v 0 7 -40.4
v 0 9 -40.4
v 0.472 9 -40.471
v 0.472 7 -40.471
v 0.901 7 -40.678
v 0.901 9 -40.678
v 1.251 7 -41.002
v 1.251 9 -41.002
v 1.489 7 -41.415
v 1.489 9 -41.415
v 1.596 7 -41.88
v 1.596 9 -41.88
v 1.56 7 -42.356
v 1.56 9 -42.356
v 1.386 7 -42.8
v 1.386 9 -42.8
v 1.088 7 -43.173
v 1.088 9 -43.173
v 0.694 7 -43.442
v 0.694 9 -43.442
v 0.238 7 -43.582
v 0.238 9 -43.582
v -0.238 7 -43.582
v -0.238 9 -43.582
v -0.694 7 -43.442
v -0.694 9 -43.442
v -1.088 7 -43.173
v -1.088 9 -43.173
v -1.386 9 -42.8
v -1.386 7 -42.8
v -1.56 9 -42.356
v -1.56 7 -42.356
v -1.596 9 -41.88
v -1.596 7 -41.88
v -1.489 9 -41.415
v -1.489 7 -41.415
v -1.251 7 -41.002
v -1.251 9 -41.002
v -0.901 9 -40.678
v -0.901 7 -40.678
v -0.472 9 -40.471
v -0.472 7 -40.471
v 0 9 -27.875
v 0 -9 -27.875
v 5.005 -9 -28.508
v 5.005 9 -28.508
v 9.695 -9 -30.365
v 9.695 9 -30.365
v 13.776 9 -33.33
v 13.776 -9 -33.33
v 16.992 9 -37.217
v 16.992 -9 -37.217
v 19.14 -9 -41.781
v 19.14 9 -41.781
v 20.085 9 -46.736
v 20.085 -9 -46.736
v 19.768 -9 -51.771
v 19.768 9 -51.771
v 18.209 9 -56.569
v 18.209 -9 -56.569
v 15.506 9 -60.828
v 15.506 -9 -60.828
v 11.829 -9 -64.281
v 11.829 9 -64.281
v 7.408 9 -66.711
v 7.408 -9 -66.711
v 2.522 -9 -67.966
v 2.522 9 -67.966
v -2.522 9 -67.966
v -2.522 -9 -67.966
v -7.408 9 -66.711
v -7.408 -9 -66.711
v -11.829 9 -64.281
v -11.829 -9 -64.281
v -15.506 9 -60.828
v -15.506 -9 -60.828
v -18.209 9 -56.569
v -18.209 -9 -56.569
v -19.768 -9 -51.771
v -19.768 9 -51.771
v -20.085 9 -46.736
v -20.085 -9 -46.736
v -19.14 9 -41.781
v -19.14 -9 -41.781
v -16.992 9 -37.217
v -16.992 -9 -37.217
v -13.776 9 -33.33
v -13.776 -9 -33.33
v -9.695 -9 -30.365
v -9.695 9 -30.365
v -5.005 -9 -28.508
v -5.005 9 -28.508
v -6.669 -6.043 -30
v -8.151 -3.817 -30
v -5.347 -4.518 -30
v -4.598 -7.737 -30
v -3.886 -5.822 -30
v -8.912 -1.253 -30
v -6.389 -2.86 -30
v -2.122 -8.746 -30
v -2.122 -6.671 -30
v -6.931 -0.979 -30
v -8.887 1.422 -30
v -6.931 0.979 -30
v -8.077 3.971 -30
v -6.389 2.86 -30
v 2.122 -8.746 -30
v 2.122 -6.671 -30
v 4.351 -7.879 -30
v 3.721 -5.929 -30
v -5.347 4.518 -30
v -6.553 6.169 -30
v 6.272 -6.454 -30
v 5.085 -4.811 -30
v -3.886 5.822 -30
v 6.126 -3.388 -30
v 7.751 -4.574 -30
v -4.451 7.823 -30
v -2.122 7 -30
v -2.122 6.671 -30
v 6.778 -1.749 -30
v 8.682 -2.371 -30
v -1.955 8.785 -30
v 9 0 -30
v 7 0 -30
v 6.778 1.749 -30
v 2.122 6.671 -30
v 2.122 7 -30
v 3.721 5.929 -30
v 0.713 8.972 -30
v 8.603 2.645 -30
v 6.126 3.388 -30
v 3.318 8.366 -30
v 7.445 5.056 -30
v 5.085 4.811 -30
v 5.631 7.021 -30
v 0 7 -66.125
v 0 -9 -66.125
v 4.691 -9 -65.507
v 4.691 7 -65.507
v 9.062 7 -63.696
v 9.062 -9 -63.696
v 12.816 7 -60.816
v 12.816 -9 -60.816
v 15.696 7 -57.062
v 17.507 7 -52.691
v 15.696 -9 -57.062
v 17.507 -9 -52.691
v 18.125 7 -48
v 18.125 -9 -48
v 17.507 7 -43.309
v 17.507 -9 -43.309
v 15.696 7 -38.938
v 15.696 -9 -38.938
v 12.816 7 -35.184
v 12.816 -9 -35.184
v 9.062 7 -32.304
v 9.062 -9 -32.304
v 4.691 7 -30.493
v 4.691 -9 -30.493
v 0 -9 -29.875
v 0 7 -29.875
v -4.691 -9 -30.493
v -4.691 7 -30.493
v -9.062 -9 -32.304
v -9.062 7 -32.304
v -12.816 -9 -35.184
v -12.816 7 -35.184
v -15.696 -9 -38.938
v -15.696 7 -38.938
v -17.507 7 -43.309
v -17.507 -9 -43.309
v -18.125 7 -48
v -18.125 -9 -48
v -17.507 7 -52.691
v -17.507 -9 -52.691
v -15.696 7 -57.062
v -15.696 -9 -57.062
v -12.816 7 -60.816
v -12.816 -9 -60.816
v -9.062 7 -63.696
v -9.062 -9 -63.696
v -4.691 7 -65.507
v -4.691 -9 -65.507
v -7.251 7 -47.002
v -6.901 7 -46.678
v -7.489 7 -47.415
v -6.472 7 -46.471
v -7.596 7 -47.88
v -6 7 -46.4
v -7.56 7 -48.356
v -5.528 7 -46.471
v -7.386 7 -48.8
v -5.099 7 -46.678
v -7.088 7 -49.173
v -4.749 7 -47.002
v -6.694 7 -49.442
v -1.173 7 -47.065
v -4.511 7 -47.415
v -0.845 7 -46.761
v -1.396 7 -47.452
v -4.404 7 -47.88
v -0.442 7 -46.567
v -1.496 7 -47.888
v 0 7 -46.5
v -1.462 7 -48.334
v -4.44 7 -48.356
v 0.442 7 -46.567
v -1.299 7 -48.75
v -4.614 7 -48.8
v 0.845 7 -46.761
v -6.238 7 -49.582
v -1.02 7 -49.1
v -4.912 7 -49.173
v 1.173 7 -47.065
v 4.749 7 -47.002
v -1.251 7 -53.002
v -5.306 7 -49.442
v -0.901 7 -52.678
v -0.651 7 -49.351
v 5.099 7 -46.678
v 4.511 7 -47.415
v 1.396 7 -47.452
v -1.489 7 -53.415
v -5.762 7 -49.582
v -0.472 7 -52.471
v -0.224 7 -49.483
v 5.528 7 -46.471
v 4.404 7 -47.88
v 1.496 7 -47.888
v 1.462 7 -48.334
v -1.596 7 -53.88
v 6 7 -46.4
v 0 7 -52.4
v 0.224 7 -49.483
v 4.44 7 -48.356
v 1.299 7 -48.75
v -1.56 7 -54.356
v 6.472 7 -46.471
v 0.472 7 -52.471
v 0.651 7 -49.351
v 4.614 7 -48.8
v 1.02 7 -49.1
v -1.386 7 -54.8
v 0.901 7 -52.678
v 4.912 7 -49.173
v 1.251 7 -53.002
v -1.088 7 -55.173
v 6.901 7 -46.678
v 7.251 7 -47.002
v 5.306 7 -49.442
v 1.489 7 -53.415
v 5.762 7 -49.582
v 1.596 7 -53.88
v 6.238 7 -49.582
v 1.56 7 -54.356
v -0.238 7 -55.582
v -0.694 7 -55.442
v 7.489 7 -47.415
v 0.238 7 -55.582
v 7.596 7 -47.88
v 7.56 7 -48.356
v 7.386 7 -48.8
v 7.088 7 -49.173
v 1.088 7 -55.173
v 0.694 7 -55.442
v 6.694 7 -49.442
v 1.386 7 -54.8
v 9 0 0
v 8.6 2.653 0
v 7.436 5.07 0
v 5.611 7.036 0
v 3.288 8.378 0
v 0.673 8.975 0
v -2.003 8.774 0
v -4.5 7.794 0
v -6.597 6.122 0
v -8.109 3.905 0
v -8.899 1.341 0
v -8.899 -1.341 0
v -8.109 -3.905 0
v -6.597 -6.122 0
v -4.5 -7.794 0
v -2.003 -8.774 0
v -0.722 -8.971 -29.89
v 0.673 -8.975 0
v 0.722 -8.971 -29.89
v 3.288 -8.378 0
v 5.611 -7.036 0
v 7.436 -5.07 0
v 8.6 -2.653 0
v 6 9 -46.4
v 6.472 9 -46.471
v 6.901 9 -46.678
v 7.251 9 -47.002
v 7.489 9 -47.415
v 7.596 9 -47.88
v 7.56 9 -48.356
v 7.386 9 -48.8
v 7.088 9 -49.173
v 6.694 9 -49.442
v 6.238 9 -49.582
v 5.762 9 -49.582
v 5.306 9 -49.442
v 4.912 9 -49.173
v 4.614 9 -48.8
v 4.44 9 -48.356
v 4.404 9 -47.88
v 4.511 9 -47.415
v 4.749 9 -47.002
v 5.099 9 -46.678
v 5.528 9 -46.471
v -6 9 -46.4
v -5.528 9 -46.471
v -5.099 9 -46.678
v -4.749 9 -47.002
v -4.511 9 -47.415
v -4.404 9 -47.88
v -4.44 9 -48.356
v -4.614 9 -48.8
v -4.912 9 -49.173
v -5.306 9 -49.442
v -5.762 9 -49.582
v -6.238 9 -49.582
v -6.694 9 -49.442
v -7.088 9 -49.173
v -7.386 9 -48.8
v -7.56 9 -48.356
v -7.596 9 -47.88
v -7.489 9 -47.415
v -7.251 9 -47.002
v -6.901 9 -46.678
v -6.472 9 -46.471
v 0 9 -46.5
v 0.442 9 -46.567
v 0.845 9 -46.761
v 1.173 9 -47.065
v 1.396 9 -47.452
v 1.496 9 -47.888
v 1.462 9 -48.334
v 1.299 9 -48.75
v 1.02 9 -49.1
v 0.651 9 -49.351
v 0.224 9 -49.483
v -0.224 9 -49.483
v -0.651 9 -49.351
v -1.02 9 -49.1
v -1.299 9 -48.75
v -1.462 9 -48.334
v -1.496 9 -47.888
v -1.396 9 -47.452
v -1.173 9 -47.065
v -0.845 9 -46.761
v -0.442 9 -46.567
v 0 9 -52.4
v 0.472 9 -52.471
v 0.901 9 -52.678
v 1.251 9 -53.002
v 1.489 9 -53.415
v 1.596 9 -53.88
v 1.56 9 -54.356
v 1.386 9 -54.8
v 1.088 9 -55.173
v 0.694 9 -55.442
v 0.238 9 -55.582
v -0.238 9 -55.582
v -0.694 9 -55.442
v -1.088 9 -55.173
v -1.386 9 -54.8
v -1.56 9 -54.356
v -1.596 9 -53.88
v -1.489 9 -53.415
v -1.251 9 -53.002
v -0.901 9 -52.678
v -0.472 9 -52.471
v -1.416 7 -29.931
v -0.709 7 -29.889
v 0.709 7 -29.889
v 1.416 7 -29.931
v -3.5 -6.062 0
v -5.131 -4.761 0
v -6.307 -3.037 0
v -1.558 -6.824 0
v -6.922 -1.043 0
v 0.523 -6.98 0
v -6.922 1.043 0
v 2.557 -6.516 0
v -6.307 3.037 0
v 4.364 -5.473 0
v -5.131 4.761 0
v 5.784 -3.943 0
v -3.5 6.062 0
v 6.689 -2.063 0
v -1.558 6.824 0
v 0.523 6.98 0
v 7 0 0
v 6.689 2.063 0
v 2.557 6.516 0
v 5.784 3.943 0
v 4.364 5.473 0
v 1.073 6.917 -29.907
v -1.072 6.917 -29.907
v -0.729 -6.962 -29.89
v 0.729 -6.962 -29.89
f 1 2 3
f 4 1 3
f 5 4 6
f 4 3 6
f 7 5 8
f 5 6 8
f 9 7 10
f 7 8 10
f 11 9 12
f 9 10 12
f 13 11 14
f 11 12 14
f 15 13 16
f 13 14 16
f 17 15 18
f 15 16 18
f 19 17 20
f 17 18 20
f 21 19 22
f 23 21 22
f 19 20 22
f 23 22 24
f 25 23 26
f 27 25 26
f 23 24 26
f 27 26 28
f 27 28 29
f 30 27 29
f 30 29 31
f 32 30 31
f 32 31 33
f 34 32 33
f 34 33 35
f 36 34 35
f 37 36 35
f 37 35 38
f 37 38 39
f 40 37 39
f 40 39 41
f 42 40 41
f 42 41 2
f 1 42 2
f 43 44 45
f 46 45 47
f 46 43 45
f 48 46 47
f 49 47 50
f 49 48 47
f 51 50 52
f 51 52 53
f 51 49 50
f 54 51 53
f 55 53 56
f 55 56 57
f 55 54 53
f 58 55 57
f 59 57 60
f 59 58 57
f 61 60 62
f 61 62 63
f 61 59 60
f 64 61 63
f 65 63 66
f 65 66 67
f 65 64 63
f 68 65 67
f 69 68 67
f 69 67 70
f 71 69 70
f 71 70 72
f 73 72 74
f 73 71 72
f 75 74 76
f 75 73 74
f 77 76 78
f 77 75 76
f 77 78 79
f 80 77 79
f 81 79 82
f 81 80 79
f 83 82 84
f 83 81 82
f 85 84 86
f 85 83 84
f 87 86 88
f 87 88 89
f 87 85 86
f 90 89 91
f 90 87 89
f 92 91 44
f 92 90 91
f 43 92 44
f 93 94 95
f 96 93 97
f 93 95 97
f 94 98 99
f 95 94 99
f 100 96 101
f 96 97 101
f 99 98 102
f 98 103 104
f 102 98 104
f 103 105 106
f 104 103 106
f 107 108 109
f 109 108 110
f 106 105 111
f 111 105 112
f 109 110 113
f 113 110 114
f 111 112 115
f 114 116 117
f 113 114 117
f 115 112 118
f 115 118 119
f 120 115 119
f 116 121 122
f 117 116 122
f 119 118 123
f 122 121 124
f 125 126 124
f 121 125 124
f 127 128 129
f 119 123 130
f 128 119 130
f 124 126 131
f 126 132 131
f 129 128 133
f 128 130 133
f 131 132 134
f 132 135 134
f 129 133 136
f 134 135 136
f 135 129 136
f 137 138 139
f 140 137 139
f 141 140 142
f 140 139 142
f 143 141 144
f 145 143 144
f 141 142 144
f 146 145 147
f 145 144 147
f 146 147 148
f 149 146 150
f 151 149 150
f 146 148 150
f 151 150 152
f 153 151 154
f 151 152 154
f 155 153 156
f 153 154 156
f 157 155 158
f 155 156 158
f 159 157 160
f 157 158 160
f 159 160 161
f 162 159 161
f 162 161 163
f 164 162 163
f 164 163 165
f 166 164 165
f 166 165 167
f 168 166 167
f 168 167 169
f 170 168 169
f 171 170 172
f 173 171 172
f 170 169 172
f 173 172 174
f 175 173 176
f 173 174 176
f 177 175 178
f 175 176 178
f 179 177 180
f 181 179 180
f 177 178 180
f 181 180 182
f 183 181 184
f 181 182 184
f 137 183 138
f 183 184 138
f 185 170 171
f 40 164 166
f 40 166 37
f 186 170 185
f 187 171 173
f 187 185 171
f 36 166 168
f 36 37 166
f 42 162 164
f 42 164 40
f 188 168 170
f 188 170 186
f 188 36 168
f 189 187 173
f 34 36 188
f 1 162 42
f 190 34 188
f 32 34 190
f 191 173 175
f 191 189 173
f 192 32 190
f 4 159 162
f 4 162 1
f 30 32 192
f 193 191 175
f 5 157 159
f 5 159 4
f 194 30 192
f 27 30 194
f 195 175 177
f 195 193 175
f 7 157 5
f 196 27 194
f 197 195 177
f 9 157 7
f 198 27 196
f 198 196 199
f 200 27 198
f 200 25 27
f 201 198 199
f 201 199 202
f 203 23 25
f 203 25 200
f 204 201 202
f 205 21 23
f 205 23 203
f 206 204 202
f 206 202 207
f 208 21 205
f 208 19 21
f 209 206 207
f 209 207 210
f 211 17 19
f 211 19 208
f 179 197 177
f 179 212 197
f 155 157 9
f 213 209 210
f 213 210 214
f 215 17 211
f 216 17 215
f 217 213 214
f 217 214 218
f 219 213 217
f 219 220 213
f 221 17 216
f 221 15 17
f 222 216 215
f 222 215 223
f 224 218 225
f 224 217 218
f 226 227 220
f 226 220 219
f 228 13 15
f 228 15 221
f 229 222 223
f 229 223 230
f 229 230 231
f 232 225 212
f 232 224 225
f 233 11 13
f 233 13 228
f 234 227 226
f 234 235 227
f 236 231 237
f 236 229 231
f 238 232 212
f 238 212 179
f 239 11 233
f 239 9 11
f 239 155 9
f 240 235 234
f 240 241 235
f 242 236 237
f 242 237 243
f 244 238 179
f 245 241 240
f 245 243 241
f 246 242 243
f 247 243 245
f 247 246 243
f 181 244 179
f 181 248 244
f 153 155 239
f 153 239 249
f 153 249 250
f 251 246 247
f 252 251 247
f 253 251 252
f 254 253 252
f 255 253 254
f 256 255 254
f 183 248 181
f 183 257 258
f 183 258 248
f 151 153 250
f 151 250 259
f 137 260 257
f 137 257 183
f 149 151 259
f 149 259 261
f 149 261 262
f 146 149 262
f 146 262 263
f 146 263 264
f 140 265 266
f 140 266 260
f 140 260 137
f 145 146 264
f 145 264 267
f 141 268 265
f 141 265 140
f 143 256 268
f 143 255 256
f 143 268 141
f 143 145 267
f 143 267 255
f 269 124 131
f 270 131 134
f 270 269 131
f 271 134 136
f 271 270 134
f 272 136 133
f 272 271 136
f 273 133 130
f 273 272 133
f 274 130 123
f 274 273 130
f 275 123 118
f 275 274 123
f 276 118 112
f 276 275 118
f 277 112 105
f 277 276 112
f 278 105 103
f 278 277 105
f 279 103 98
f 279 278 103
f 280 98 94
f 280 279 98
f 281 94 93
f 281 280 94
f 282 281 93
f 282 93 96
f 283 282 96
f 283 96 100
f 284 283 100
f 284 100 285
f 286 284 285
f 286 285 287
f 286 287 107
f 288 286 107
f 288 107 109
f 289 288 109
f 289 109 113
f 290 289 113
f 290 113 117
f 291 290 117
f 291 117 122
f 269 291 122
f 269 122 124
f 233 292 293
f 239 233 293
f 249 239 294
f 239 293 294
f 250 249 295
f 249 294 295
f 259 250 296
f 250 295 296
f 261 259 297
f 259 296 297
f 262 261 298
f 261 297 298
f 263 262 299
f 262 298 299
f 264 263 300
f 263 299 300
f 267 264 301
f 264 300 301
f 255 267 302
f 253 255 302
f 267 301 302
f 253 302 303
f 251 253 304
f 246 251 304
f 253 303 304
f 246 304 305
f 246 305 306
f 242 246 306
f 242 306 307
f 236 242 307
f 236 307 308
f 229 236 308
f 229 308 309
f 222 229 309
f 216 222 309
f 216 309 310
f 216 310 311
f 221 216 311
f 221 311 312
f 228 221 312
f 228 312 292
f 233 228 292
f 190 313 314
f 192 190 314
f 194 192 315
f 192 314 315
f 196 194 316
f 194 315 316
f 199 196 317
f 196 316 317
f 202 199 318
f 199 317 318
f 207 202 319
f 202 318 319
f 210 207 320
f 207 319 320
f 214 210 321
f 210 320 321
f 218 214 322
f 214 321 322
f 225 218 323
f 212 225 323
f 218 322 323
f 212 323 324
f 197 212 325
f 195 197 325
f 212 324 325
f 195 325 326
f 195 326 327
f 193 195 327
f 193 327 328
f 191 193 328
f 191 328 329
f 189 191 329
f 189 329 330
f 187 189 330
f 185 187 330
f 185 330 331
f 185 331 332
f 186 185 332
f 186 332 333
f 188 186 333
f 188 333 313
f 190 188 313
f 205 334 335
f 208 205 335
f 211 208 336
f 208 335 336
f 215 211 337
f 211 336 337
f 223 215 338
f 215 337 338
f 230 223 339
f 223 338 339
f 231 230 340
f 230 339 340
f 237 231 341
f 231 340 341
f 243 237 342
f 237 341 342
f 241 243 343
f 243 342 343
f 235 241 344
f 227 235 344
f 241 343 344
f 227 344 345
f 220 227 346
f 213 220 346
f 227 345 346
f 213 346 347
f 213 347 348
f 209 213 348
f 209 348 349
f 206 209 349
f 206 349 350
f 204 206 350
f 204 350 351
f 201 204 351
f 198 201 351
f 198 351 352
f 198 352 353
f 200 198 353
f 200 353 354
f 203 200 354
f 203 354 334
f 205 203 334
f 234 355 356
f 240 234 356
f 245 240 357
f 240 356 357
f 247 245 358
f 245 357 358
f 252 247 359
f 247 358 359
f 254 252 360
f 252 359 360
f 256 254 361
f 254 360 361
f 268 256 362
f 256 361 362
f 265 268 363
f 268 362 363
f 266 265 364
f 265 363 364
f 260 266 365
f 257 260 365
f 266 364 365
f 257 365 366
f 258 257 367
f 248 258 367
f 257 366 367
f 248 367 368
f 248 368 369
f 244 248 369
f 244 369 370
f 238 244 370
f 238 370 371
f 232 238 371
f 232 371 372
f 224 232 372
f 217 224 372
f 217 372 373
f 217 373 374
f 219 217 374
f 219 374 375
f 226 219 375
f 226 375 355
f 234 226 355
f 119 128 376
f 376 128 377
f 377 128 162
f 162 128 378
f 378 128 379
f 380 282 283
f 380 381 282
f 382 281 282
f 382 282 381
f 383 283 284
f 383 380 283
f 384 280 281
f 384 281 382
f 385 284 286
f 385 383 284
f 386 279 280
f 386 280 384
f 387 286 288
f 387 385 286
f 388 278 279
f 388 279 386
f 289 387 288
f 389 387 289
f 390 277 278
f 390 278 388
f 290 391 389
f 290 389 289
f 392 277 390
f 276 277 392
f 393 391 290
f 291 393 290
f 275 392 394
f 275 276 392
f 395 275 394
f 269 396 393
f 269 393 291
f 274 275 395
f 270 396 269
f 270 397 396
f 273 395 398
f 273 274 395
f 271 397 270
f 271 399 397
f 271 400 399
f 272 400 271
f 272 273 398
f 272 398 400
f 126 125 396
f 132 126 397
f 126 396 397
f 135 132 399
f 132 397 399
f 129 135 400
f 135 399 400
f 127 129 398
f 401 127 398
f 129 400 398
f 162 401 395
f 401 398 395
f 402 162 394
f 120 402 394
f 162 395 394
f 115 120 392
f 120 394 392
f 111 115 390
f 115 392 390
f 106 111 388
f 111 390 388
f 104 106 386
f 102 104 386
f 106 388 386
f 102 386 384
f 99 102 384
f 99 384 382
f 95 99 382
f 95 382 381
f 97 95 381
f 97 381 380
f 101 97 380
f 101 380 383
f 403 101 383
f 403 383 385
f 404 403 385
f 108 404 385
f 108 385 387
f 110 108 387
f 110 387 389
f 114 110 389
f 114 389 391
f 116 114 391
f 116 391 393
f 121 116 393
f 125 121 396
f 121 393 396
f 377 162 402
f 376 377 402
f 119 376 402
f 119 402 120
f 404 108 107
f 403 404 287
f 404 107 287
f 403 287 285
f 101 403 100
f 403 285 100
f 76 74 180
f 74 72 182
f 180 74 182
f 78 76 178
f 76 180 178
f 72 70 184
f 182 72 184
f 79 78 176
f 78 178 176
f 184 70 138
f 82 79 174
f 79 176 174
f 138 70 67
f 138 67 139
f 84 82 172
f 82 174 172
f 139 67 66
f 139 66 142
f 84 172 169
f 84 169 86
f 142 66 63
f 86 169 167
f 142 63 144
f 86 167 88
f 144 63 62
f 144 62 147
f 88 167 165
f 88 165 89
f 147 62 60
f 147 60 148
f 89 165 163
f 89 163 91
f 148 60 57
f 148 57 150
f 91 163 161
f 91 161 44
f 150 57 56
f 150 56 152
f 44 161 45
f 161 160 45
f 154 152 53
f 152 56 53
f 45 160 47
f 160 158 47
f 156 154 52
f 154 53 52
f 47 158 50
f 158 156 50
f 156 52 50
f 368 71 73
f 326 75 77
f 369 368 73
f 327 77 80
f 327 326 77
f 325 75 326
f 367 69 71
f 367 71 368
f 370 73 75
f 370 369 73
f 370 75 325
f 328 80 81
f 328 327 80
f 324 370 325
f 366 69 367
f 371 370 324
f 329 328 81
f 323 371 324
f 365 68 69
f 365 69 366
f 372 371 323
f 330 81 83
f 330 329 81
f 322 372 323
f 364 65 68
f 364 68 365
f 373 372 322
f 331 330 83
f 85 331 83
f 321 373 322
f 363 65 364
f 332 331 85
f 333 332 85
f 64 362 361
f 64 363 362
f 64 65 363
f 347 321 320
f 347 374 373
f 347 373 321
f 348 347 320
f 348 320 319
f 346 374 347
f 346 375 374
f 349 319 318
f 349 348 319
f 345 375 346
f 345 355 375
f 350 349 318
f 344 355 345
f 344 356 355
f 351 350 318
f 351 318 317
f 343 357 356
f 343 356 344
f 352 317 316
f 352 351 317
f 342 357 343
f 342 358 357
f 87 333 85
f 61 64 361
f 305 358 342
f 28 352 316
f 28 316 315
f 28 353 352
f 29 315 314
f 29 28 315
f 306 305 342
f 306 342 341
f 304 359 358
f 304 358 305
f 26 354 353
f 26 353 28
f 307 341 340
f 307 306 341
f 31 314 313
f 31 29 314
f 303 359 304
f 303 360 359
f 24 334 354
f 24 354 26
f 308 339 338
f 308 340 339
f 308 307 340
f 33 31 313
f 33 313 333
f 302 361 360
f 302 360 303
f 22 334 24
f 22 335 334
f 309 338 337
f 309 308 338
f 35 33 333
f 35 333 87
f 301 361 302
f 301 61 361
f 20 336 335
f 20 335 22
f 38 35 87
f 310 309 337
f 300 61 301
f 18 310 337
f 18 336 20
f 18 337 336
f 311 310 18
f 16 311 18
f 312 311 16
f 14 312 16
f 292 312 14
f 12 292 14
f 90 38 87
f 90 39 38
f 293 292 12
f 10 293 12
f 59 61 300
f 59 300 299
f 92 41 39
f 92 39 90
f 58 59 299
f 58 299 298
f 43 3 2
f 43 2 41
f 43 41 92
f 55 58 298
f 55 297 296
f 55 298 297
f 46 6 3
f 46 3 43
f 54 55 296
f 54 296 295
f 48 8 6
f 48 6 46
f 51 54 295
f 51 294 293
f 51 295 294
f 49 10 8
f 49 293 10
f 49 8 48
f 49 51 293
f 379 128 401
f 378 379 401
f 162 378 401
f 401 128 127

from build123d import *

# Parameters (mm, degrees)
SKETCH1_R           = 9
SKETCH1_R_2         = 7
BOSS_EXTRUDE1_DEPTH = 30
BOSS_EXTRUDE2_START = 9
SKETCH3_R           = 20.124611797
SKETCH3_R_2         = 1.5
SKETCH3_R_3         = 1.6
BOSS_EXTRUDE2_DEPTH = 18
SKETCH4_R           = 18.124611797
CUT_EXTRUDE1_DEPTH  = 16


with BuildPart() as part:
    # Sketch1 → Boss-Extrude1 (new body)
    with BuildSketch(Plane.XY):
        Circle(SKETCH1_R)
        Circle(SKETCH1_R_2, mode=Mode.SUBTRACT)
    extrude(amount=-BOSS_EXTRUDE1_DEPTH)


with BuildPart() as body_2:
    # Sketch3 → Boss-Extrude2 (new body)
    with BuildSketch(Plane(origin=(0, 0, 0), x_dir=(1, 0, 0), z_dir=(0, 1, 0)).offset(BOSS_EXTRUDE2_START)):
        with Locations(Location((0, 48, 0), (0, 0, 270))):
            Circle(SKETCH3_R)
        with Locations(Location((0, 48, 0), (0, 0, 270))):
            Circle(SKETCH3_R_2, mode=Mode.SUBTRACT)
        with Locations(Location((0, 42, 0), (0, 0, 270))):
            Circle(SKETCH3_R_3, mode=Mode.SUBTRACT)
        with Locations(Location((-6, 48, 0), (0, 0, 270))):
            Circle(SKETCH3_R_3, mode=Mode.SUBTRACT)
        with Locations(Location((6, 48, 0), (0, 0, 270))):
            Circle(SKETCH3_R_3, mode=Mode.SUBTRACT)
        with Locations(Location((0, 54, 0), (0, 0, 270))):
            Circle(SKETCH3_R_3, mode=Mode.SUBTRACT)
    extrude(amount=-BOSS_EXTRUDE2_DEPTH)


with BuildPart() as cut_extrude1_tool:
    # Sketch4 → Cut-Extrude1 (new body)
    with BuildSketch(Plane.XZ.offset(9)):
        with Locations(Location((0, -48, 0), (0, 0, 270))):
            Circle(SKETCH4_R)
    extrude(amount=-CUT_EXTRUDE1_DEPTH)


with BuildPart() as part_1:
    add(part.part)

    # Cut-Extrude1: cut by cut_extrude1_tool
    add(cut_extrude1_tool.part, mode=Mode.SUBTRACT)


with BuildPart() as body_2_1:
    add(body_2.part)

    # Cut-Extrude1: cut by cut_extrude1_tool
    add(cut_extrude1_tool.part, mode=Mode.SUBTRACT)


solid = Compound([part_1.part, body_2_1.part])
